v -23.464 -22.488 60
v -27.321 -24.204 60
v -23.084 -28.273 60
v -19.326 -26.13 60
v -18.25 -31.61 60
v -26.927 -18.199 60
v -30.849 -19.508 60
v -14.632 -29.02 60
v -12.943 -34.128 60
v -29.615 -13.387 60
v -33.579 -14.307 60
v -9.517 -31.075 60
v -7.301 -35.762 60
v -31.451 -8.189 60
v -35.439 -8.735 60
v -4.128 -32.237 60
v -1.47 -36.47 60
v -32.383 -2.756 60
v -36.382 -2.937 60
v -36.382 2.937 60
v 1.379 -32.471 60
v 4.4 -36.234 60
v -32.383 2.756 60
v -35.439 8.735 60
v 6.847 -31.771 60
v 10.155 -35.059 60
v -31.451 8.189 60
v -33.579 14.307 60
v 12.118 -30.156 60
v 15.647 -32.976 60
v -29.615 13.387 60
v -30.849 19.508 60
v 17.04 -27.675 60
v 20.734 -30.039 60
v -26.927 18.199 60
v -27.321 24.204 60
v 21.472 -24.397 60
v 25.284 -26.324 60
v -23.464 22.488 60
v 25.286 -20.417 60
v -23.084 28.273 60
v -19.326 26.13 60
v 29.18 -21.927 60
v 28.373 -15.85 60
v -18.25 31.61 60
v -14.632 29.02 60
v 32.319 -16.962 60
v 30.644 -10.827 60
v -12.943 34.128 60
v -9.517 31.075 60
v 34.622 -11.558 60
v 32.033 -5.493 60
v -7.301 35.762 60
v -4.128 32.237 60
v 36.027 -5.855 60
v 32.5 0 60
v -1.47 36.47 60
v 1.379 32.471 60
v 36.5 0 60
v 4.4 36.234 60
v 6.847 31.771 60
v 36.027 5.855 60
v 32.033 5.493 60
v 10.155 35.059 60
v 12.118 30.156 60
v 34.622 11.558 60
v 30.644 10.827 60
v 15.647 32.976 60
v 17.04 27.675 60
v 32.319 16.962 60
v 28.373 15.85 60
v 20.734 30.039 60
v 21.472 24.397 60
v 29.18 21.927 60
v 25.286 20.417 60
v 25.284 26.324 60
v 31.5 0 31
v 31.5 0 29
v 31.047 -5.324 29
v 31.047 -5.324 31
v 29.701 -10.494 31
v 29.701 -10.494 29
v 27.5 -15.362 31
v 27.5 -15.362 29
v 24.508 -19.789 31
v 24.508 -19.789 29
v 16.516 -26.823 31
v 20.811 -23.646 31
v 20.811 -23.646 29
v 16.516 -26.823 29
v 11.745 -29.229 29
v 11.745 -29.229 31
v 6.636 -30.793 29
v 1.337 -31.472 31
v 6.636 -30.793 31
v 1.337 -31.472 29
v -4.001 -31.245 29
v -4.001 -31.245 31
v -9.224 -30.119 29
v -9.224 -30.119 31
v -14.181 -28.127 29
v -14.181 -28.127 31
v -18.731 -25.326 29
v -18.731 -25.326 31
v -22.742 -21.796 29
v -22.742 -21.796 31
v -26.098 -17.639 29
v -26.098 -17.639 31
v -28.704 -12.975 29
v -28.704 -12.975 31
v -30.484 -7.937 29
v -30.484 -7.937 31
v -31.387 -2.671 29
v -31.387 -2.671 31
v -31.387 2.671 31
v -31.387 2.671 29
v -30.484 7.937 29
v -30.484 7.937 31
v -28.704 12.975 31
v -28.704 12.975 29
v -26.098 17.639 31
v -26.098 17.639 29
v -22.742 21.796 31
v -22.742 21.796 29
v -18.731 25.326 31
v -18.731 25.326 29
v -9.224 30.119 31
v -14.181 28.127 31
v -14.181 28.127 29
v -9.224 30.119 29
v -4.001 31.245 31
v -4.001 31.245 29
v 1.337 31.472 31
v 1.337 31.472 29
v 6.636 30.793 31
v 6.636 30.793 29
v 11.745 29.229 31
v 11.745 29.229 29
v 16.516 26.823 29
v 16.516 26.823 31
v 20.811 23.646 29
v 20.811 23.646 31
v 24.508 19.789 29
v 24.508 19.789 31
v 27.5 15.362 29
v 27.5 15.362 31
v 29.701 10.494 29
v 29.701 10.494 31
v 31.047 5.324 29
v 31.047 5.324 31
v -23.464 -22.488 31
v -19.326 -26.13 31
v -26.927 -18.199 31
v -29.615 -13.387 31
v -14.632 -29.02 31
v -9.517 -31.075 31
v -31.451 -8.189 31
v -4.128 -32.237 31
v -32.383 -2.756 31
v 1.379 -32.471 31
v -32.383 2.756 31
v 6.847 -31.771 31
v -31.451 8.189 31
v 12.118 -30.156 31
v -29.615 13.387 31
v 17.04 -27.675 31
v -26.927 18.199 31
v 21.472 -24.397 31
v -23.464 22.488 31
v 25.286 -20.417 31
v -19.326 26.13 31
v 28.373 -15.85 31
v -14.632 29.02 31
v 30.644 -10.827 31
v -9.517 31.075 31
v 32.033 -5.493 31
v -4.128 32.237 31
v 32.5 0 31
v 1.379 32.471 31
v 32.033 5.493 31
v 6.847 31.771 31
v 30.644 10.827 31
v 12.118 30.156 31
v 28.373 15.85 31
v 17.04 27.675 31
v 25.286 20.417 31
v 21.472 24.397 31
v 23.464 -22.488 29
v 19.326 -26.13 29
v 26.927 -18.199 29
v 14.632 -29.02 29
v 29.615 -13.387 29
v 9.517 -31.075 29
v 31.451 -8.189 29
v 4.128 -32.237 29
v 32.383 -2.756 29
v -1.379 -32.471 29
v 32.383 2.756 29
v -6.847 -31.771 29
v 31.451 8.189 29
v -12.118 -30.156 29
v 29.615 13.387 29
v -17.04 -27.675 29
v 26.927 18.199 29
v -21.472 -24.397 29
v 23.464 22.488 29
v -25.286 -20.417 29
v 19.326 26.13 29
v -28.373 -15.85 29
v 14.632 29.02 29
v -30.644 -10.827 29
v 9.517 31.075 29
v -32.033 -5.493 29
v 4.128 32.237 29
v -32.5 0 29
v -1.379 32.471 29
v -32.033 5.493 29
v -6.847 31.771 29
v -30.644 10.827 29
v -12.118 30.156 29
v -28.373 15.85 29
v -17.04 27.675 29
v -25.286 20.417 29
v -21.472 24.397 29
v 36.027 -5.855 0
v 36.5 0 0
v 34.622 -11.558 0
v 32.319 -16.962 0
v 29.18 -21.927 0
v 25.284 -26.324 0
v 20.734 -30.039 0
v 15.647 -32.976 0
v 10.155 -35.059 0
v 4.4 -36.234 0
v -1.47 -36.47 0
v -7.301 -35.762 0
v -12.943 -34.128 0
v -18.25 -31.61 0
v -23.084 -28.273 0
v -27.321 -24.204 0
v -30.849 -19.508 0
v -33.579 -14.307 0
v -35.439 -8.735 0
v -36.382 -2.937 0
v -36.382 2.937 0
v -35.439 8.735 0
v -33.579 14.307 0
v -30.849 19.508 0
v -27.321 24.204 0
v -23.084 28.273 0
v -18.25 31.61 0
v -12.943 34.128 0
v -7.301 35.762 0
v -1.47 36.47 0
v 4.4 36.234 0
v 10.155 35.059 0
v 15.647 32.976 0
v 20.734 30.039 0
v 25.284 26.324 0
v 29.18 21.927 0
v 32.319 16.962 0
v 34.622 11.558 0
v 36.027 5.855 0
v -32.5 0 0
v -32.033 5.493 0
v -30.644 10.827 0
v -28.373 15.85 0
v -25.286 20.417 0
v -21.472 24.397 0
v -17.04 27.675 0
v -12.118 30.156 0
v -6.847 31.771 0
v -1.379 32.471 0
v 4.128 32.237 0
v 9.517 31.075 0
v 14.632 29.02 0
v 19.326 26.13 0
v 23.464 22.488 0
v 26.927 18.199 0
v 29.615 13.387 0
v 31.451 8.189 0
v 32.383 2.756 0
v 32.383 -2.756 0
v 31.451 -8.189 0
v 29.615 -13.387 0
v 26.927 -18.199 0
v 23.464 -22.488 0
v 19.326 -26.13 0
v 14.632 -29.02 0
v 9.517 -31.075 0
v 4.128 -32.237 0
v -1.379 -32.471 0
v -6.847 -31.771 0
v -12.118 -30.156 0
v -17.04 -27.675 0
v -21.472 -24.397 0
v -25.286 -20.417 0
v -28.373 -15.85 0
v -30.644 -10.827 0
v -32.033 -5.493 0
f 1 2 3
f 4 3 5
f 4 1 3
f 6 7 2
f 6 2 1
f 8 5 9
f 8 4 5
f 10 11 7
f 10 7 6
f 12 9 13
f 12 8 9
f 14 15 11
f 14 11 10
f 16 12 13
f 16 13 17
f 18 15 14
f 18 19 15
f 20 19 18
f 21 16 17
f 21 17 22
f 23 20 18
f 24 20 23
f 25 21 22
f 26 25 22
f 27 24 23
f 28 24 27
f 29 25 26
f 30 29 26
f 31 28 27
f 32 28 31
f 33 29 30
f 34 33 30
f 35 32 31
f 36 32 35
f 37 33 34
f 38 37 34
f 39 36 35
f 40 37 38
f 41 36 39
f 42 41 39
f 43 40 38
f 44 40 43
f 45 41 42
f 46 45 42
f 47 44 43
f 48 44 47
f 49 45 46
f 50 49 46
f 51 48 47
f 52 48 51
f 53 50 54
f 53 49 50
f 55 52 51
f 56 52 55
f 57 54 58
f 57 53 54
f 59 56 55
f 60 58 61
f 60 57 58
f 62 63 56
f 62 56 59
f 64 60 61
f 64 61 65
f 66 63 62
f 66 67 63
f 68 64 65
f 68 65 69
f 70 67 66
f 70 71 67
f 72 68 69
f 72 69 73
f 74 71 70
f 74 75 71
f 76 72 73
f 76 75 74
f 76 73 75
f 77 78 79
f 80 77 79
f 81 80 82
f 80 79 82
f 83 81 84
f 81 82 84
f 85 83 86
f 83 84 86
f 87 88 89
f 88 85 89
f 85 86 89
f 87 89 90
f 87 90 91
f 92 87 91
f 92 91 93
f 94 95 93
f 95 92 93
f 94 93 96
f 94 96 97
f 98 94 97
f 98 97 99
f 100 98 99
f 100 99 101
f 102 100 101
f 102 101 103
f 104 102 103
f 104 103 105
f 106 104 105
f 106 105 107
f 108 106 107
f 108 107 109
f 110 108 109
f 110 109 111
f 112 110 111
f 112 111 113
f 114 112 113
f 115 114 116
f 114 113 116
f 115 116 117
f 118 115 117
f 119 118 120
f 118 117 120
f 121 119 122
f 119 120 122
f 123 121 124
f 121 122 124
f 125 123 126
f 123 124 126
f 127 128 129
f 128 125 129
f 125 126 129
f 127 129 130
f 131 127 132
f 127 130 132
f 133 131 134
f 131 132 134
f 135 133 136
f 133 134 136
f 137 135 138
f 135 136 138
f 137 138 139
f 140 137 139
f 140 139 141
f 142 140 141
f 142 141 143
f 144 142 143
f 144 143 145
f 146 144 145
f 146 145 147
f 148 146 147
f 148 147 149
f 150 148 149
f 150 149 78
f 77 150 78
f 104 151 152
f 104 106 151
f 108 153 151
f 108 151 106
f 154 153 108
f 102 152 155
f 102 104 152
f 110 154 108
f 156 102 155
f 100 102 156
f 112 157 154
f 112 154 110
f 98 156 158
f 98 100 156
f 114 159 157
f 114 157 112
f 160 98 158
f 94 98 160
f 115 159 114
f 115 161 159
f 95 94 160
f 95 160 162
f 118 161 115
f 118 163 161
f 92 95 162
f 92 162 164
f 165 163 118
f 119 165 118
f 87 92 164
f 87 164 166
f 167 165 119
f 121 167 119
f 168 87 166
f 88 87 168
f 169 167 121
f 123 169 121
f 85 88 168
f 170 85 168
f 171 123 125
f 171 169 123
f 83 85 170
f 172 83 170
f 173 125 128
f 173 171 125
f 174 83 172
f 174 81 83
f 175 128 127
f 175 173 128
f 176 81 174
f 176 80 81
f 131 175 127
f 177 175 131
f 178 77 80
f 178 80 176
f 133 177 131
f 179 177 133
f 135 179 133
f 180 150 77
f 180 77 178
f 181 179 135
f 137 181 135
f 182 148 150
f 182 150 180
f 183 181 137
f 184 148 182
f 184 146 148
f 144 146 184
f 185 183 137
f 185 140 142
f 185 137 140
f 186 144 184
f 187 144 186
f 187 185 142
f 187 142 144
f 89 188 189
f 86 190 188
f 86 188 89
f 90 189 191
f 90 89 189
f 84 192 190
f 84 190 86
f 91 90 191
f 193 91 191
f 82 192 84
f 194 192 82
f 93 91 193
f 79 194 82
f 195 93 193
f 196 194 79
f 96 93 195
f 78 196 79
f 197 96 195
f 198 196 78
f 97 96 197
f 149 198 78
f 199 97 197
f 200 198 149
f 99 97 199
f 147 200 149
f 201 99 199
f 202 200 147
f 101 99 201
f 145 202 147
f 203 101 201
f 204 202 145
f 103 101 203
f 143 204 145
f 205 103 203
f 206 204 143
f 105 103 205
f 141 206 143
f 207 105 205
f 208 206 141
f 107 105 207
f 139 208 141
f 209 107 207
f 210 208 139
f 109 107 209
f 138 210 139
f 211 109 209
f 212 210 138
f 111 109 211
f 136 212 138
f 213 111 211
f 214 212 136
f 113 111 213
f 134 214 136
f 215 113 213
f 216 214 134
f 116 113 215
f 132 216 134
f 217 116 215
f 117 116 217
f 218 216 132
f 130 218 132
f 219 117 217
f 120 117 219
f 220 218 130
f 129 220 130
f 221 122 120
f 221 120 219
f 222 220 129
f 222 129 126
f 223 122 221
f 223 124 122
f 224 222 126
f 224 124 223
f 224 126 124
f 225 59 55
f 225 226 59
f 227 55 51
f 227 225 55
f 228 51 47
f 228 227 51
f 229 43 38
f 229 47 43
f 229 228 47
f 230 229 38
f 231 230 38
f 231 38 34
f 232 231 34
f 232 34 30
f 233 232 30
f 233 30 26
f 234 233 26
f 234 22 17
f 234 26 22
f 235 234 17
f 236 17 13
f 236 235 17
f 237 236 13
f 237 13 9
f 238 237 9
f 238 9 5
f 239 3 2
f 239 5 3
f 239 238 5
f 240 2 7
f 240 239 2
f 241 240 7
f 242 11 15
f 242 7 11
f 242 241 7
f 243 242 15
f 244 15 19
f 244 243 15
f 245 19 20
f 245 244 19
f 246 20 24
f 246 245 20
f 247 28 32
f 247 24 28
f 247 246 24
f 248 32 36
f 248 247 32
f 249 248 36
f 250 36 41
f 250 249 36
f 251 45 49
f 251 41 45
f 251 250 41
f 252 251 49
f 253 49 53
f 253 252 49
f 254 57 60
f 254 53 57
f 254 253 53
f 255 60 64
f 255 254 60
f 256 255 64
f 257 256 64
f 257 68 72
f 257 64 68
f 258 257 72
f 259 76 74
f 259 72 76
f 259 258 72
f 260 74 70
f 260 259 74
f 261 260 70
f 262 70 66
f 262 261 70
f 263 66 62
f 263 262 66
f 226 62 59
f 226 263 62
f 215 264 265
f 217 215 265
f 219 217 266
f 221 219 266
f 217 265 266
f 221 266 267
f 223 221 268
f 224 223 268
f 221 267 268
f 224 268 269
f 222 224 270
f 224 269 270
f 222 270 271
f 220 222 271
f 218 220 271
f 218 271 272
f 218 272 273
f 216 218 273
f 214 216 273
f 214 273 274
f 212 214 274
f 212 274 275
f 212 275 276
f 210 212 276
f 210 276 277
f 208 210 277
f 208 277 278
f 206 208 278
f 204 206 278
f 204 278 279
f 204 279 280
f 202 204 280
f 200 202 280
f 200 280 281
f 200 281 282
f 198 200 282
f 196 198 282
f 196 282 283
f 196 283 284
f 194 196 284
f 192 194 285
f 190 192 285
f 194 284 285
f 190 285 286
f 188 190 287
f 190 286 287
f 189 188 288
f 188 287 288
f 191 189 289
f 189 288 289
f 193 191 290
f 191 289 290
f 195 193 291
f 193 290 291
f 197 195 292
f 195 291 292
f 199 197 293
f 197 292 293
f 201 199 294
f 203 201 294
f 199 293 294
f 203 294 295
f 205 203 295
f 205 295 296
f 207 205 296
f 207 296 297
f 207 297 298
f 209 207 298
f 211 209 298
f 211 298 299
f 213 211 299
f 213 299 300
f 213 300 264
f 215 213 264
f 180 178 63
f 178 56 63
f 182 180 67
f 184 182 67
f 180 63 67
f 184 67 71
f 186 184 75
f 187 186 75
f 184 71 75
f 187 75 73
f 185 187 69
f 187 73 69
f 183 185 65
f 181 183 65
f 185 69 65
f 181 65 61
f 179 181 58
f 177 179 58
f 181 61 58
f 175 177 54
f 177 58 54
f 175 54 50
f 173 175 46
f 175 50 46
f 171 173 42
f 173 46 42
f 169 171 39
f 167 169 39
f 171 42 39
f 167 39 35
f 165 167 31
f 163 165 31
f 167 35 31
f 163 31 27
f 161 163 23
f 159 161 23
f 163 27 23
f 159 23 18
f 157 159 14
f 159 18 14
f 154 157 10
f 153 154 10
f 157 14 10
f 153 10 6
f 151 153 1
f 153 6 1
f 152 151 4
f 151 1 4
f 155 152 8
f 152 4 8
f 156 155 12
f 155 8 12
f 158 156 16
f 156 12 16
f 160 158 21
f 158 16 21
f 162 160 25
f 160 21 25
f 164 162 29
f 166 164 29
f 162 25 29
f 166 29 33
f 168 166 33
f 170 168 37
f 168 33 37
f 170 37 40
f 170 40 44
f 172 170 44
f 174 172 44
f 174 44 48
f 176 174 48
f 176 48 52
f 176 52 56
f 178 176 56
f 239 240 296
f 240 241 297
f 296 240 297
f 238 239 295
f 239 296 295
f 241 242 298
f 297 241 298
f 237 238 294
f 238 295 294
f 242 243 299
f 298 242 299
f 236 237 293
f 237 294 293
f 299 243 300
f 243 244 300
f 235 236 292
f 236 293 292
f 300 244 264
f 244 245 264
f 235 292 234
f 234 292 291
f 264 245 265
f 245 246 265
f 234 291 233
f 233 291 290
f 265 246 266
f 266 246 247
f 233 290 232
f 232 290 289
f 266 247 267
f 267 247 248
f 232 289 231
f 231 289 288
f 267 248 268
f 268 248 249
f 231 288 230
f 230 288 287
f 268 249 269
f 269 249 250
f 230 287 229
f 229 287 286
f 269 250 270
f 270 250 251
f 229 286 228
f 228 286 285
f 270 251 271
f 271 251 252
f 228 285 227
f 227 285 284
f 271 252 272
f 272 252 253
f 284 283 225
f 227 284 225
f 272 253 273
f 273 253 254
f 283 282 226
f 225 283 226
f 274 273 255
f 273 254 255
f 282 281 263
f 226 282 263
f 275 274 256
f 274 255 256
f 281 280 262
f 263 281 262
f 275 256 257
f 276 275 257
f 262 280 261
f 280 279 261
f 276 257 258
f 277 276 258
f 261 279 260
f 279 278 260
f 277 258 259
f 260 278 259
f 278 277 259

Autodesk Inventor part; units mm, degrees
ref_plane "YZ Plane" through (0, 0, 0) normal (1, 0, 0) x (0, 1, 0)
ref_plane "XZ Plane" through (0, 0, 0) normal (0, 1, 0) x (-1, 0, 0)
ref_plane "XY Plane" through (0, 0, 0) normal (0, 0, 1) x (1, 0, 0)
sketch "Sketch1" plane through (0, 0, 0) normal (0, 0, 1) x (1, 0, 0)
  circle A0 centre (0, 0) radius 31.5
  circle A1 centre (0, 0) radius 36.5
  dimension "d0" = 63
  dimension "d1" = 5
extrude "Extrusion1" add sketch "Sketch1" along normal blind 60
sketch "Sketch3" plane through (0, 0, 60) normal (0, 0, 1) x (1, 0, 0)
  circle A0 centre (0, 0) radius 31.5 projected
  circle A1 centre (0, 0) radius 36.5 projected
  circle A2 centre (0, 0) radius 32.5
  dimension "d4" = 65
extrude "Extrusion2" cut sketch "Sketch3" against normal blind 29 contours A2
sketch "Sketch4" plane through (0, 0, 0) normal (0, 0, -1) x (-1, 0, 0)
  circle A0 centre (0, 0) radius 31.5 projected
  circle A1 centre (0, 0) radius 36.5 projected
  circle A2 centre (0, 0) radius 32.5
  dimension "d7" = 65
extrude "Extrusion3" cut sketch "Sketch4" against normal blind 29 contours A2
properties part number "coupler_2in" material "PVC-Piping"
